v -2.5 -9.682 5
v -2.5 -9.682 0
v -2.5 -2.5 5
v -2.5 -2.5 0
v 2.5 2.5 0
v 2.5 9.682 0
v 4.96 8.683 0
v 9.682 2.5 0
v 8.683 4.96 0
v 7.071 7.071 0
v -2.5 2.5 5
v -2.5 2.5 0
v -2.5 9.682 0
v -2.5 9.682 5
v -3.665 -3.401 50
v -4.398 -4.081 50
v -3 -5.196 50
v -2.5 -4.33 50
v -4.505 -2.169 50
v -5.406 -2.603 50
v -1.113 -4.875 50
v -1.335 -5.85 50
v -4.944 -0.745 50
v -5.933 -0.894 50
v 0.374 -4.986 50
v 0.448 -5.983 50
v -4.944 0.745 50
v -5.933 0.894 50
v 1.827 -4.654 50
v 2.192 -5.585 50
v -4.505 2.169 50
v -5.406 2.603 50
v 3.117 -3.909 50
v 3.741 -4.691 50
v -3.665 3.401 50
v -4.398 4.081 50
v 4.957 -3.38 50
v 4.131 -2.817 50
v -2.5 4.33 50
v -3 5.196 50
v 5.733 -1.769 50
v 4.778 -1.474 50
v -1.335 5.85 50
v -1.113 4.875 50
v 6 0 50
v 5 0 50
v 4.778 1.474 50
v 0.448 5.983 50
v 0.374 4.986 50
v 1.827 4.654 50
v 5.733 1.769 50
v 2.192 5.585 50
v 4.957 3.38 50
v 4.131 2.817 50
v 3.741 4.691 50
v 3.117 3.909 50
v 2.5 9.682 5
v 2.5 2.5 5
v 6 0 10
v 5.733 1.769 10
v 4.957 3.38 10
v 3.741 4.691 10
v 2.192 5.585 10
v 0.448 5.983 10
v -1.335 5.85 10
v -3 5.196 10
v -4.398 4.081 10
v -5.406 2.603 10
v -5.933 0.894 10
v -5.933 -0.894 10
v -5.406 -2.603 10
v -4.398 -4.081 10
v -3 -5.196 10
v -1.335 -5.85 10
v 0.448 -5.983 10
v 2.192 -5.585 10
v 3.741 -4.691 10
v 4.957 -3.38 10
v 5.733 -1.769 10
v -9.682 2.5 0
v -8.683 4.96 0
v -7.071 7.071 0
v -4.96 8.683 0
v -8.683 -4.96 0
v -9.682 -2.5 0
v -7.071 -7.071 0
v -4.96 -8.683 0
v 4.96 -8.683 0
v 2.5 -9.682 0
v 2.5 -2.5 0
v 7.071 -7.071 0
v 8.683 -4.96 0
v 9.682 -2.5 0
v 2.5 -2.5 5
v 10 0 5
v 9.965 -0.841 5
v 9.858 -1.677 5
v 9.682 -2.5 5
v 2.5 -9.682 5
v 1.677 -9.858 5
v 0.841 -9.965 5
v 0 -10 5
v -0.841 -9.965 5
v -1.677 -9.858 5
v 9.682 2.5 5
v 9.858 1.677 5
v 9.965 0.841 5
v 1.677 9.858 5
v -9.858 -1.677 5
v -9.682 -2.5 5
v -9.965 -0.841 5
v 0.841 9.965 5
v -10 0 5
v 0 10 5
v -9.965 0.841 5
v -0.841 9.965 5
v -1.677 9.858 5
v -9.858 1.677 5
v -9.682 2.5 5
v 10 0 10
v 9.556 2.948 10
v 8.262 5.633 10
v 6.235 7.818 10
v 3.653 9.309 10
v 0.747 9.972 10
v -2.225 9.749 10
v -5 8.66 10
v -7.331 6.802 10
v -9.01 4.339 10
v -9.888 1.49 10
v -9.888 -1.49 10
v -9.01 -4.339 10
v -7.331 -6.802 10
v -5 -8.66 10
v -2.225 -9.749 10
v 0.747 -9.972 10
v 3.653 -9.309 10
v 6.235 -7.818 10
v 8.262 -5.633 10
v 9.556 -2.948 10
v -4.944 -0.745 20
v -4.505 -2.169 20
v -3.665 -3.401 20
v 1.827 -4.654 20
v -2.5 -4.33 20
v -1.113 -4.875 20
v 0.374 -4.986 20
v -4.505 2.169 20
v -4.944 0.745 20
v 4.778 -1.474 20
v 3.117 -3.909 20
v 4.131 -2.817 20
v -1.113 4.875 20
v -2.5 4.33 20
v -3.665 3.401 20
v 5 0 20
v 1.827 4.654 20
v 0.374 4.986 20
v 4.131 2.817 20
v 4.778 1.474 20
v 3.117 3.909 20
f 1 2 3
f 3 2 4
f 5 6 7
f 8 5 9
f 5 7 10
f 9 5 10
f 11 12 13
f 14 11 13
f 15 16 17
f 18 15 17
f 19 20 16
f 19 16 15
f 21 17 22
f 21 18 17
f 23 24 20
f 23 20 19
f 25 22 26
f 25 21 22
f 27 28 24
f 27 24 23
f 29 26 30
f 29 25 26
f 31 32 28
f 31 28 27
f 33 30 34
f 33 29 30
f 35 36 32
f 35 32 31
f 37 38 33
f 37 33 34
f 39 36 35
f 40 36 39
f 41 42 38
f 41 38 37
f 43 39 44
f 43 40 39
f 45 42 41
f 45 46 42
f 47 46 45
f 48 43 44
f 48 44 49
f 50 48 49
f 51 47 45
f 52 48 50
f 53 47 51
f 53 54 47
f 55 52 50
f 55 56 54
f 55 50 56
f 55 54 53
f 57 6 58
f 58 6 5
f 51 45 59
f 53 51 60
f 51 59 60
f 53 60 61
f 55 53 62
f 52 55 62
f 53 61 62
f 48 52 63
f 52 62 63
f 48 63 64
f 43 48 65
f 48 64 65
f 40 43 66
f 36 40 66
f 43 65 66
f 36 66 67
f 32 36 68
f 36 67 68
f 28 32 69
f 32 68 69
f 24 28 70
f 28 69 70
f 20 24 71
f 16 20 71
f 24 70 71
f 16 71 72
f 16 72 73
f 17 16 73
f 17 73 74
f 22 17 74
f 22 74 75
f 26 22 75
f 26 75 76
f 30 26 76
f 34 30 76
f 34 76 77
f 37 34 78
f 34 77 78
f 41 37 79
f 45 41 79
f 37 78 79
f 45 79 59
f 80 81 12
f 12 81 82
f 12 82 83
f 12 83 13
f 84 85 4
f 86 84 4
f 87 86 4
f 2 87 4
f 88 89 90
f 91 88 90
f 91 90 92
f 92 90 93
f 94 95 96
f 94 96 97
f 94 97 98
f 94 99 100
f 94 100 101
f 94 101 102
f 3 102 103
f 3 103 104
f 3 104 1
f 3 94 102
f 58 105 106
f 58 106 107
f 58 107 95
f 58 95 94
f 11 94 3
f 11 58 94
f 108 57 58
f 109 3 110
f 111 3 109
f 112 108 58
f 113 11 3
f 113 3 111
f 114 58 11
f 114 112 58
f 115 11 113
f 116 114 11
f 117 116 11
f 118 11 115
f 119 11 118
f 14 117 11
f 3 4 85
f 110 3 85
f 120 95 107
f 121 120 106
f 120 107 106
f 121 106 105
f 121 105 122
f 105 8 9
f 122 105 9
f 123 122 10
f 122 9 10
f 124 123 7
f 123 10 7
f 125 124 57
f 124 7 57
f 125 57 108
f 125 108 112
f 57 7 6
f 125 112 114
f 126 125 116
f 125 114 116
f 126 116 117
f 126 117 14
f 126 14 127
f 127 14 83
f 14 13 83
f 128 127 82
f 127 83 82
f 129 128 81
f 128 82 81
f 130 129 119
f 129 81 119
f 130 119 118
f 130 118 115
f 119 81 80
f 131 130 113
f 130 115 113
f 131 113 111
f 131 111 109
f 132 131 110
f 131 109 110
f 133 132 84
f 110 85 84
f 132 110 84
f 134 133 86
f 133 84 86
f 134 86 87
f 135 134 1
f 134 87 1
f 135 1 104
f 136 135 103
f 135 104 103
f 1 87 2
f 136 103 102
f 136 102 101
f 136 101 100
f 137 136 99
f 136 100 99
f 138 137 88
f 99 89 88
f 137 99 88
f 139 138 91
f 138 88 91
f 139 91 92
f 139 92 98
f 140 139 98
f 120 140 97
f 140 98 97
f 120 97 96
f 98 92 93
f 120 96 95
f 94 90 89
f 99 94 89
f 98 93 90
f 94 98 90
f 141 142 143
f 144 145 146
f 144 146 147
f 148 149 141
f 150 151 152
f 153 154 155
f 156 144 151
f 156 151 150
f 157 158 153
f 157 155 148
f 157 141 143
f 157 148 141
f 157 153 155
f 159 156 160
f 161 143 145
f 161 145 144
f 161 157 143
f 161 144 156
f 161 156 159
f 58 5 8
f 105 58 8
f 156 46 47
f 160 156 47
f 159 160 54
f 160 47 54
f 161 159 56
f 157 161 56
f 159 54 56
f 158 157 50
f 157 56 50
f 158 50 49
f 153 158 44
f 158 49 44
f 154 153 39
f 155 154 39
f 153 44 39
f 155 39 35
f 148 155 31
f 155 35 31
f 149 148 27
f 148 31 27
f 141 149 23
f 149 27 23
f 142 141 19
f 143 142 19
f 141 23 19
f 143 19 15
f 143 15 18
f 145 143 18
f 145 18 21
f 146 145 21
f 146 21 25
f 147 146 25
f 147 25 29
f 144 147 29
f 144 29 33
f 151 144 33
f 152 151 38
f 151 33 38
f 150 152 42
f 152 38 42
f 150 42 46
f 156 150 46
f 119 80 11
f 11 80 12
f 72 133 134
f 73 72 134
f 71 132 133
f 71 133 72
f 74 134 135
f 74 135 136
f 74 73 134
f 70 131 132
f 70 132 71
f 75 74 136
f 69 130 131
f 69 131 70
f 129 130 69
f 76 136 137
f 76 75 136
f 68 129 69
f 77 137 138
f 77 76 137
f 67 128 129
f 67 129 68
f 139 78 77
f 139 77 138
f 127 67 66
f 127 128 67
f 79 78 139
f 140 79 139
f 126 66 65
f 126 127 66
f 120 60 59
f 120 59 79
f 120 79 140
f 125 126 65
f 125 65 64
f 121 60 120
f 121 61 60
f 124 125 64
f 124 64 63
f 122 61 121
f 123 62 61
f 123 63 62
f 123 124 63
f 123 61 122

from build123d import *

# Parameters (mm, degrees)
ESQUISSE1_R             = 10
BOSS_EXTRU_1_DEPTH      = 10
ESQUISSE2_R             = 6
BOSS_EXTRU_2_DEPTH      = 40
ESQUISSE3_R             = 5
ENL_V_MAT_EXTRU_1_DEPTH = 30
ESQUISSE5_W             = 5
ESQUISSE5_H             = 5
ENL_V_MAT_EXTRU_2_DEPTH = 5


with BuildPart() as part:
    # Esquisse1 → Boss.-Extru.1 (new body)
    with BuildSketch(Plane.XY):
        Circle(ESQUISSE1_R)
    extrude(amount=BOSS_EXTRU_1_DEPTH)

    # Esquisse2 → Boss.-Extru.2 (add)
    with BuildSketch(Plane.XY.offset(10)):
        Circle(ESQUISSE2_R)
    extrude(amount=BOSS_EXTRU_2_DEPTH)

    # Esquisse3 → Enlèv. mat.-Extru.1 (cut)
    with BuildSketch(Plane.XY.offset(50)):
        Circle(ESQUISSE3_R)
    extrude(amount=-ENL_V_MAT_EXTRU_1_DEPTH, mode=Mode.SUBTRACT)

    # Esquisse5 → Enlèv. mat.-Extru.2 (cut)
    with BuildSketch(Plane(origin=(0, 0, 0), x_dir=(-1, 0, 0), z_dir=(0, 0, -1))):
        with BuildLine():
            Line((-2.5, 9.682458366), (-2.5, 2.5))
            Line((-2.5, 2.5), (2.5, 2.5))
            Line((2.5, 2.5), (2.5, 9.682458366))
            ThreePointArc((2.5, 9.682458366), (1.260042925, 9.920296963), (0, 10))
            ThreePointArc((0, 10), (-1.260042925, 9.920296963), (-2.5, 9.682458366))
        make_face()
        with BuildLine():
            Line((-2.5, 2.5), (-9.682458366, 2.5))
            ThreePointArc((-9.682458366, 2.5), (-9.920296963, 1.260042925), (-10, 0))
            ThreePointArc((-10, 0), (-9.920296963, -1.260042925), (-9.682458366, -2.5))
            Line((-9.682458366, -2.5), (-2.5, -2.5))
            Line((-2.5, -2.5), (-2.5, 2.5))
        make_face()
        Rectangle(ESQUISSE5_W, ESQUISSE5_H)
        with BuildLine():
            Line((9.682458366, 2.5), (2.5, 2.5))
            Line((2.5, 2.5), (2.5, -2.5))
            Line((2.5, -2.5), (9.682458366, -2.5))
            ThreePointArc((9.682458366, -2.5), (9.920296963, -1.260042925), (10, 0))
            ThreePointArc((10, 0), (9.920296963, 1.260042925), (9.682458366, 2.5))
        make_face()
        with BuildLine():
            Line((2.5, -2.5), (-2.5, -2.5))
            Line((-2.5, -2.5), (-2.5, -9.682458366))
            ThreePointArc((-2.5, -9.682458366), (-1.260042925, -9.920296963), (0, -10))
            ThreePointArc((0, -10), (1.260042925, -9.920296963), (2.5, -9.682458366))
            Line((2.5, -9.682458366), (2.5, -2.5))
        make_face()
    extrude(amount=-ENL_V_MAT_EXTRU_2_DEPTH, mode=Mode.SUBTRACT)


solid = part.part
